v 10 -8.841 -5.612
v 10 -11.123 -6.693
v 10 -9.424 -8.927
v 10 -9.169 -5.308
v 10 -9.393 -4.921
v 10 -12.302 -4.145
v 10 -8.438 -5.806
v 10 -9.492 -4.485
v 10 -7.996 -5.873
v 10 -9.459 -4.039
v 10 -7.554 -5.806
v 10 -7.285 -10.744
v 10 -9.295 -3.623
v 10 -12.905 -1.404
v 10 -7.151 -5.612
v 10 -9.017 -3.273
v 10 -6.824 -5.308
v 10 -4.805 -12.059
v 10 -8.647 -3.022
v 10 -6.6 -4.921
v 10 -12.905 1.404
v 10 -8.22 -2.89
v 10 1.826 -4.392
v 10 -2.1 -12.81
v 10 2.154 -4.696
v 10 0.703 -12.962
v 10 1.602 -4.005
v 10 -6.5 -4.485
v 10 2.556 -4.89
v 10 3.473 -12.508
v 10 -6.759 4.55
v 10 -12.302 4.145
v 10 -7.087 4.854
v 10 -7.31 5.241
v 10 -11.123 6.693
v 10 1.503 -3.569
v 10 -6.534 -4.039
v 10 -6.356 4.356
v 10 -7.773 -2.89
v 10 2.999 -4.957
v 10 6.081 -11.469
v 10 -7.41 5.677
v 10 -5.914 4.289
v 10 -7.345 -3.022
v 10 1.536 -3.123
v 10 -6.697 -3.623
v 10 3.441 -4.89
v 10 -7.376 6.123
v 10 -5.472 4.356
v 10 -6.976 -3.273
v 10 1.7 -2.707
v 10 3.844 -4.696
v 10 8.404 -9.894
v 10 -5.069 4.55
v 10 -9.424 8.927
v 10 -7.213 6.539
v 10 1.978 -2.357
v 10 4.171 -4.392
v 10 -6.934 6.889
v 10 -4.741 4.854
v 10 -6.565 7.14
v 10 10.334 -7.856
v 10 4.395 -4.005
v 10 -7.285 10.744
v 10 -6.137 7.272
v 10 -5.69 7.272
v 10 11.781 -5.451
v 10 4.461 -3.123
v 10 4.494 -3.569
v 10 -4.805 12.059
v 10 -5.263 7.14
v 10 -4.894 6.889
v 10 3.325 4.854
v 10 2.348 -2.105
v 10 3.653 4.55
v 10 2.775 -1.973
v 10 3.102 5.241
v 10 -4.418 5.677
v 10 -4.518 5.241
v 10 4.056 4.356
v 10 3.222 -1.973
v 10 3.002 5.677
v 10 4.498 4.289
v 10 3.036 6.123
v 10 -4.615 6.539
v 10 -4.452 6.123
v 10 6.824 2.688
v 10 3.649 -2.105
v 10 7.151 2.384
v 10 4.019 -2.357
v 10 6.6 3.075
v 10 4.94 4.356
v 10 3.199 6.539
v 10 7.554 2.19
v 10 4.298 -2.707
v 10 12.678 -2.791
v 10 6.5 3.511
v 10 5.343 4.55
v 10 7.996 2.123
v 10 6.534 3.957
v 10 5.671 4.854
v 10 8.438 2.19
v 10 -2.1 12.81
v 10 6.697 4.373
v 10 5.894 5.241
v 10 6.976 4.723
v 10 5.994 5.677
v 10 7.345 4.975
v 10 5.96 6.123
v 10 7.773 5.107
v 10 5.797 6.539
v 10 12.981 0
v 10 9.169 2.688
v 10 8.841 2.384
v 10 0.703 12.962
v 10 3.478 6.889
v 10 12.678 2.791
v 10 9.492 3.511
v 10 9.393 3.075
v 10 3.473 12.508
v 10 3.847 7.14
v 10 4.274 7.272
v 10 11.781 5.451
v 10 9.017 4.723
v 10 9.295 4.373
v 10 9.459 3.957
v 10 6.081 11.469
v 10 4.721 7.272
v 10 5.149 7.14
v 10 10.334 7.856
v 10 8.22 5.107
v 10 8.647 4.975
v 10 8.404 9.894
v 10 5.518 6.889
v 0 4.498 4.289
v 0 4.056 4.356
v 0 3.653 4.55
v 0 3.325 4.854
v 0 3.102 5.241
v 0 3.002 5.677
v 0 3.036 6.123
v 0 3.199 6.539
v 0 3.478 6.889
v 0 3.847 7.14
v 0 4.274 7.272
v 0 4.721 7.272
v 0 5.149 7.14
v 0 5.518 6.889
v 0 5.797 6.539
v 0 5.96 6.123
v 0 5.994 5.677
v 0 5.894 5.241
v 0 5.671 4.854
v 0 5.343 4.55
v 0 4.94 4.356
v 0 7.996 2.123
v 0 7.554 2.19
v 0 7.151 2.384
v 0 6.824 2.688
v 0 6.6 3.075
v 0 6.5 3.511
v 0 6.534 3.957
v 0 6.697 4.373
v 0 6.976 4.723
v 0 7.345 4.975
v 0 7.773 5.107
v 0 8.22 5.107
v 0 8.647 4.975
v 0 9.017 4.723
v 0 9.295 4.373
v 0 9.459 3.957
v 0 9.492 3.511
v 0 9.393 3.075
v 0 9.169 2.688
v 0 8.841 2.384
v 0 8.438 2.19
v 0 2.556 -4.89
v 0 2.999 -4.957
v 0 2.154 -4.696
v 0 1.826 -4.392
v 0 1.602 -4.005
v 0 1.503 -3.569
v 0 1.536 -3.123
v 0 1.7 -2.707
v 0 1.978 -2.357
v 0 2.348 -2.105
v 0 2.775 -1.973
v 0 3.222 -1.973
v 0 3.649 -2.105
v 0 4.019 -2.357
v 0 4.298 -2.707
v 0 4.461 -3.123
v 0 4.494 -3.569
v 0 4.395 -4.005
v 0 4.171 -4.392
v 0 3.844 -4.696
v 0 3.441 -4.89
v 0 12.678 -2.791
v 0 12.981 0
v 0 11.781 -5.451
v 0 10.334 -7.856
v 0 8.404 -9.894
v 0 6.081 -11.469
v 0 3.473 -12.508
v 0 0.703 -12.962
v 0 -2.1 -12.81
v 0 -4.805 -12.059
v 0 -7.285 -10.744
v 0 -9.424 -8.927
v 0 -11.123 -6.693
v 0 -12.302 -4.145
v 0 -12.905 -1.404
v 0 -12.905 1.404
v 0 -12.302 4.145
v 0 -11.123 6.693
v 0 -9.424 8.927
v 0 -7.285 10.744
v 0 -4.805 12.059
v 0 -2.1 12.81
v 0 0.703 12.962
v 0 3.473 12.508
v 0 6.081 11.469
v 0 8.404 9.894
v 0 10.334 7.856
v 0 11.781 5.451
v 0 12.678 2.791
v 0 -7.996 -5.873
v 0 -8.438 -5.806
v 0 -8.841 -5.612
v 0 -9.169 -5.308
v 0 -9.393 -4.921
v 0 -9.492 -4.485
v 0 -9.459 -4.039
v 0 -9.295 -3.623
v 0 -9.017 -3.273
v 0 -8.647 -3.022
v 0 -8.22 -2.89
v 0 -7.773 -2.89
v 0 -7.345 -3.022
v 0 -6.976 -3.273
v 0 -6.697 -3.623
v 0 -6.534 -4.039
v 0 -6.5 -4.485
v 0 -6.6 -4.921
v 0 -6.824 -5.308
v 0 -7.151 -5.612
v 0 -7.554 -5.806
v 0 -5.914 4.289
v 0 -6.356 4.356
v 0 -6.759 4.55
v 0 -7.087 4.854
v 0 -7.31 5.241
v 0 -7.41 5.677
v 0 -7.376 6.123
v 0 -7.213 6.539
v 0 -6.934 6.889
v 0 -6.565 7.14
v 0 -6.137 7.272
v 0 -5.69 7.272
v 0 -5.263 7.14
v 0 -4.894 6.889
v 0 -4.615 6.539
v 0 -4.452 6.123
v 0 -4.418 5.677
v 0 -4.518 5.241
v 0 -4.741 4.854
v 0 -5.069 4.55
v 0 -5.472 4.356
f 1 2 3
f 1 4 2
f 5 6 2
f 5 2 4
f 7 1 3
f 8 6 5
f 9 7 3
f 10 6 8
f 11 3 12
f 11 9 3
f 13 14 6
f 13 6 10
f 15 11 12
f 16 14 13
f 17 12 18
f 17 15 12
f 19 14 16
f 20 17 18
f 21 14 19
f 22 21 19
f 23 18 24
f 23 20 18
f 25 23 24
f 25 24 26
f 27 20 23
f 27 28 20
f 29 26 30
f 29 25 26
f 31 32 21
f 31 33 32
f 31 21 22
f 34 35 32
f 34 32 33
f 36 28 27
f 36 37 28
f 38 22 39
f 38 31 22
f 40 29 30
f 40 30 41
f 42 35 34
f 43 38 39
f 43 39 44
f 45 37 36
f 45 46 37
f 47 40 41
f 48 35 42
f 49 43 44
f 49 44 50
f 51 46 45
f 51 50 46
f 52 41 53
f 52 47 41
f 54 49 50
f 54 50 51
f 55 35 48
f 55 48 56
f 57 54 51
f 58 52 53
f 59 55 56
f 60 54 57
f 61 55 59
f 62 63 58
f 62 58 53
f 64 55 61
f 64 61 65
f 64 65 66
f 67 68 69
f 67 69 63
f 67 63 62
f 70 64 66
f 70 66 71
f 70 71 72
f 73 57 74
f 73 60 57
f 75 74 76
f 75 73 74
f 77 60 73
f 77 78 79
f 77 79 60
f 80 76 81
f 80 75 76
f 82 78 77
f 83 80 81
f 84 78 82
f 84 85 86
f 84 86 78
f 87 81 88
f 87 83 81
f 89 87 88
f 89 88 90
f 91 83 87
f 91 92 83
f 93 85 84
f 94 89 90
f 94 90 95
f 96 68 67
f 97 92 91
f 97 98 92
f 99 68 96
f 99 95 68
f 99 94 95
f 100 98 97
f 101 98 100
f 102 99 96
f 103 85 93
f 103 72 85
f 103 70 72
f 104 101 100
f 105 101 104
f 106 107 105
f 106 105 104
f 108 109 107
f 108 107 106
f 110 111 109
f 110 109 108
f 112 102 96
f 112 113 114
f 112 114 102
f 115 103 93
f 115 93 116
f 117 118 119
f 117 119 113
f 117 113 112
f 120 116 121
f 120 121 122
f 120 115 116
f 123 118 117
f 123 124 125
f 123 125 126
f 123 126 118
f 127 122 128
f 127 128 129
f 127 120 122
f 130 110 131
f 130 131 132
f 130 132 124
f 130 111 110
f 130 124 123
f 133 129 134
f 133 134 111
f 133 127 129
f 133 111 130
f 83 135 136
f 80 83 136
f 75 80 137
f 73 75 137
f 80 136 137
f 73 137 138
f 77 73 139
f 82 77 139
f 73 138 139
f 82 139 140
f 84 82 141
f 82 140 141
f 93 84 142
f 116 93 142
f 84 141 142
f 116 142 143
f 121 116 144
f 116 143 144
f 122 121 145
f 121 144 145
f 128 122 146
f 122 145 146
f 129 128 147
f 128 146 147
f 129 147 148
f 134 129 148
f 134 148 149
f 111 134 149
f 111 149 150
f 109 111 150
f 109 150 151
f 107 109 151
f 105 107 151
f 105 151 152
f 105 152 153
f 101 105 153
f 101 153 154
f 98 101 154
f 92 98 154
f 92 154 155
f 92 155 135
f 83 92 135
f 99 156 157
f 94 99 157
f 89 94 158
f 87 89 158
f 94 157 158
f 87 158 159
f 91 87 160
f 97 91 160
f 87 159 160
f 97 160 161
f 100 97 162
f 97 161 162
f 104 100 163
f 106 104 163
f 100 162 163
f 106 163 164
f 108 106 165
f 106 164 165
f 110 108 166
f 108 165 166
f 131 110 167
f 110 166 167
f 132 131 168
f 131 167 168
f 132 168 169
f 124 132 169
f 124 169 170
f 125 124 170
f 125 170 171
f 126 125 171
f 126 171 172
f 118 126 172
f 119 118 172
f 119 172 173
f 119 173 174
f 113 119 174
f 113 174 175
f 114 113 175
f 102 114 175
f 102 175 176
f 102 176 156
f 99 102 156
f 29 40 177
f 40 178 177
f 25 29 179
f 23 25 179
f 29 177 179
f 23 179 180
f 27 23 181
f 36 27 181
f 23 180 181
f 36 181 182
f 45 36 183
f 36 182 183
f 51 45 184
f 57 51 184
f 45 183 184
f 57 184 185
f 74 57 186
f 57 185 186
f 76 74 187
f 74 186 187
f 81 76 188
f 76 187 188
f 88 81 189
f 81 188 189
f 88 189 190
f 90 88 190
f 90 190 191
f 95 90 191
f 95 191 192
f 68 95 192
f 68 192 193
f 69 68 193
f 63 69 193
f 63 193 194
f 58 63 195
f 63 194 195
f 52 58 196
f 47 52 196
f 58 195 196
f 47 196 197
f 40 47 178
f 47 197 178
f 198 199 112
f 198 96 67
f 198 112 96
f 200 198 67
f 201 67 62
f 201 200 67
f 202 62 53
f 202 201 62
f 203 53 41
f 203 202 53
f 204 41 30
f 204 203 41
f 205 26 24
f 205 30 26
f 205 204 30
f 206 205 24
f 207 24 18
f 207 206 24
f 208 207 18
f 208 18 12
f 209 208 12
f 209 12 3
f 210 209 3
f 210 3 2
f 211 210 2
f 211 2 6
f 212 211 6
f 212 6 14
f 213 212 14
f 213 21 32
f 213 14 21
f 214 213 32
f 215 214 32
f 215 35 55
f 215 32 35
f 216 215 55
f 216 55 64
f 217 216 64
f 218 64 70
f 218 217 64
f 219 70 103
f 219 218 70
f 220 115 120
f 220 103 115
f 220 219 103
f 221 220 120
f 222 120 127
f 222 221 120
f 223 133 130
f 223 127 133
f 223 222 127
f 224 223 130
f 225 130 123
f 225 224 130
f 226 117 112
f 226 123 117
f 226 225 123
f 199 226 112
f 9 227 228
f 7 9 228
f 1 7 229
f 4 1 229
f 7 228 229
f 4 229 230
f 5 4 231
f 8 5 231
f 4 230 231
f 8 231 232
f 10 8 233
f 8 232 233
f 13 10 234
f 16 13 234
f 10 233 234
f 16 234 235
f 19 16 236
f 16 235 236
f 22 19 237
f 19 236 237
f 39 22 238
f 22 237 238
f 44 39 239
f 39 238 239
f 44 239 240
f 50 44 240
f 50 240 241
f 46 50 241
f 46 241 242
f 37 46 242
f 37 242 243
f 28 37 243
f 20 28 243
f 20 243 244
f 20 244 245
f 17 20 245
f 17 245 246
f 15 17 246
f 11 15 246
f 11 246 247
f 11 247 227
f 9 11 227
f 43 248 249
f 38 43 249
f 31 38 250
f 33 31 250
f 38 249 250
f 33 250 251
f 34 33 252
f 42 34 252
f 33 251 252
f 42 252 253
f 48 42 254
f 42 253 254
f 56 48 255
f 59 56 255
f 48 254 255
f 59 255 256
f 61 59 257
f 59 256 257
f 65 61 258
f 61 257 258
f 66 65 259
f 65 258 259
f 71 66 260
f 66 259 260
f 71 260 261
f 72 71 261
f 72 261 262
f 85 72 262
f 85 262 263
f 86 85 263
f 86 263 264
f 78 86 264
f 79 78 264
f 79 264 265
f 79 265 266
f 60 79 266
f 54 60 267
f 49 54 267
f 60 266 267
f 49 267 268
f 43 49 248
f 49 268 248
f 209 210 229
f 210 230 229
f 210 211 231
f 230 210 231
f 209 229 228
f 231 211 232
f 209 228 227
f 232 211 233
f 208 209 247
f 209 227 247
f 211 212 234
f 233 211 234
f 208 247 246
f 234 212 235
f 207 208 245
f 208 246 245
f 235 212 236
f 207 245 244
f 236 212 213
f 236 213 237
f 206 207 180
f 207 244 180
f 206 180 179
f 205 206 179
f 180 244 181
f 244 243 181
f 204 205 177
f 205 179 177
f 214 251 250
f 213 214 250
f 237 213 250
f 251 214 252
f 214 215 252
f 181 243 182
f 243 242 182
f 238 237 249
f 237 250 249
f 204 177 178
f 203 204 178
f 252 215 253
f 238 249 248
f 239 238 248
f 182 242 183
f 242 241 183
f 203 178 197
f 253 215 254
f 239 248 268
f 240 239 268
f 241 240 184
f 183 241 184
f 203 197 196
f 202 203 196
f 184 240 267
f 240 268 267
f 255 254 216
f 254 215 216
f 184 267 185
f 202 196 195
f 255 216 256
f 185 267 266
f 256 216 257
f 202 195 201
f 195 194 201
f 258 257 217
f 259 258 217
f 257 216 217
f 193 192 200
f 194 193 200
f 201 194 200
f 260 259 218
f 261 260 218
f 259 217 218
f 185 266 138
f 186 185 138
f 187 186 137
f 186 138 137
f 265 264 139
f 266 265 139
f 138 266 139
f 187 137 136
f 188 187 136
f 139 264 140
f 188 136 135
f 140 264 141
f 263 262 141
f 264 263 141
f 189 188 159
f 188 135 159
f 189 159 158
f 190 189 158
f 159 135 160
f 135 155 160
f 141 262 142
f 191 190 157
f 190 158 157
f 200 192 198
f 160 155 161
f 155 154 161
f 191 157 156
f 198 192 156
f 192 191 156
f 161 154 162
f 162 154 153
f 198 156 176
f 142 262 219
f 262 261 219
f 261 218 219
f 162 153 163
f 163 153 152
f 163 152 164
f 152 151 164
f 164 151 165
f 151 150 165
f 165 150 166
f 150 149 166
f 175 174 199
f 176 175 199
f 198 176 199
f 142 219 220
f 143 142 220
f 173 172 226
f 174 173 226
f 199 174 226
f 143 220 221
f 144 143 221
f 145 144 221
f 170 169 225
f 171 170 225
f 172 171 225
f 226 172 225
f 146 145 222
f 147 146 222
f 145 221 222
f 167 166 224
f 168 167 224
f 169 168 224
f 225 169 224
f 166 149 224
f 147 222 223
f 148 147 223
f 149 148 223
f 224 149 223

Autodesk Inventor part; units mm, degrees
ref_plane "YZ Plane" through (0, 0, 0) normal (1, 0, 0) x (0, 1, 0)
ref_plane "XZ Plane" through (0, 0, 0) normal (0, 1, 0) x (-1, 0, 0)
ref_plane "XY Plane" through (0, 0, 0) normal (0, 0, 1) x (1, 0, 0)
sketch "Sketch1" plane through (0, 0, 0) normal (1, 0, 0) x (0, 1, 0)
  circle A0 centre (0, 0) radius 12.9812
extrude "Extrusion1" add sketch "Sketch1" along normal blind 10
sketch "Sketch2" plane through (10, 0, 0) normal (1, 0, 0) x (0, 0, -1)
  point P0 (0, 0)
  point P1 (3.4567, 2.9986)
  point P2 (-5.789, 4.4979)
  point P3 (-3.6233, 7.9963)
  point P4 (4.373, -7.9963)
  point P5 (-5.789, -5.9139)
hole "Hole1" at (10, 2.9986, -3.4567) at (10, 4.4979, 5.789) at (10, 7.9963, 3.6233) at (10, -7.9963, -4.373) at (10, -5.9139, 5.789) direction (-1, 0, 0) diameter 3 end through all
properties part number "madeinlinux"
